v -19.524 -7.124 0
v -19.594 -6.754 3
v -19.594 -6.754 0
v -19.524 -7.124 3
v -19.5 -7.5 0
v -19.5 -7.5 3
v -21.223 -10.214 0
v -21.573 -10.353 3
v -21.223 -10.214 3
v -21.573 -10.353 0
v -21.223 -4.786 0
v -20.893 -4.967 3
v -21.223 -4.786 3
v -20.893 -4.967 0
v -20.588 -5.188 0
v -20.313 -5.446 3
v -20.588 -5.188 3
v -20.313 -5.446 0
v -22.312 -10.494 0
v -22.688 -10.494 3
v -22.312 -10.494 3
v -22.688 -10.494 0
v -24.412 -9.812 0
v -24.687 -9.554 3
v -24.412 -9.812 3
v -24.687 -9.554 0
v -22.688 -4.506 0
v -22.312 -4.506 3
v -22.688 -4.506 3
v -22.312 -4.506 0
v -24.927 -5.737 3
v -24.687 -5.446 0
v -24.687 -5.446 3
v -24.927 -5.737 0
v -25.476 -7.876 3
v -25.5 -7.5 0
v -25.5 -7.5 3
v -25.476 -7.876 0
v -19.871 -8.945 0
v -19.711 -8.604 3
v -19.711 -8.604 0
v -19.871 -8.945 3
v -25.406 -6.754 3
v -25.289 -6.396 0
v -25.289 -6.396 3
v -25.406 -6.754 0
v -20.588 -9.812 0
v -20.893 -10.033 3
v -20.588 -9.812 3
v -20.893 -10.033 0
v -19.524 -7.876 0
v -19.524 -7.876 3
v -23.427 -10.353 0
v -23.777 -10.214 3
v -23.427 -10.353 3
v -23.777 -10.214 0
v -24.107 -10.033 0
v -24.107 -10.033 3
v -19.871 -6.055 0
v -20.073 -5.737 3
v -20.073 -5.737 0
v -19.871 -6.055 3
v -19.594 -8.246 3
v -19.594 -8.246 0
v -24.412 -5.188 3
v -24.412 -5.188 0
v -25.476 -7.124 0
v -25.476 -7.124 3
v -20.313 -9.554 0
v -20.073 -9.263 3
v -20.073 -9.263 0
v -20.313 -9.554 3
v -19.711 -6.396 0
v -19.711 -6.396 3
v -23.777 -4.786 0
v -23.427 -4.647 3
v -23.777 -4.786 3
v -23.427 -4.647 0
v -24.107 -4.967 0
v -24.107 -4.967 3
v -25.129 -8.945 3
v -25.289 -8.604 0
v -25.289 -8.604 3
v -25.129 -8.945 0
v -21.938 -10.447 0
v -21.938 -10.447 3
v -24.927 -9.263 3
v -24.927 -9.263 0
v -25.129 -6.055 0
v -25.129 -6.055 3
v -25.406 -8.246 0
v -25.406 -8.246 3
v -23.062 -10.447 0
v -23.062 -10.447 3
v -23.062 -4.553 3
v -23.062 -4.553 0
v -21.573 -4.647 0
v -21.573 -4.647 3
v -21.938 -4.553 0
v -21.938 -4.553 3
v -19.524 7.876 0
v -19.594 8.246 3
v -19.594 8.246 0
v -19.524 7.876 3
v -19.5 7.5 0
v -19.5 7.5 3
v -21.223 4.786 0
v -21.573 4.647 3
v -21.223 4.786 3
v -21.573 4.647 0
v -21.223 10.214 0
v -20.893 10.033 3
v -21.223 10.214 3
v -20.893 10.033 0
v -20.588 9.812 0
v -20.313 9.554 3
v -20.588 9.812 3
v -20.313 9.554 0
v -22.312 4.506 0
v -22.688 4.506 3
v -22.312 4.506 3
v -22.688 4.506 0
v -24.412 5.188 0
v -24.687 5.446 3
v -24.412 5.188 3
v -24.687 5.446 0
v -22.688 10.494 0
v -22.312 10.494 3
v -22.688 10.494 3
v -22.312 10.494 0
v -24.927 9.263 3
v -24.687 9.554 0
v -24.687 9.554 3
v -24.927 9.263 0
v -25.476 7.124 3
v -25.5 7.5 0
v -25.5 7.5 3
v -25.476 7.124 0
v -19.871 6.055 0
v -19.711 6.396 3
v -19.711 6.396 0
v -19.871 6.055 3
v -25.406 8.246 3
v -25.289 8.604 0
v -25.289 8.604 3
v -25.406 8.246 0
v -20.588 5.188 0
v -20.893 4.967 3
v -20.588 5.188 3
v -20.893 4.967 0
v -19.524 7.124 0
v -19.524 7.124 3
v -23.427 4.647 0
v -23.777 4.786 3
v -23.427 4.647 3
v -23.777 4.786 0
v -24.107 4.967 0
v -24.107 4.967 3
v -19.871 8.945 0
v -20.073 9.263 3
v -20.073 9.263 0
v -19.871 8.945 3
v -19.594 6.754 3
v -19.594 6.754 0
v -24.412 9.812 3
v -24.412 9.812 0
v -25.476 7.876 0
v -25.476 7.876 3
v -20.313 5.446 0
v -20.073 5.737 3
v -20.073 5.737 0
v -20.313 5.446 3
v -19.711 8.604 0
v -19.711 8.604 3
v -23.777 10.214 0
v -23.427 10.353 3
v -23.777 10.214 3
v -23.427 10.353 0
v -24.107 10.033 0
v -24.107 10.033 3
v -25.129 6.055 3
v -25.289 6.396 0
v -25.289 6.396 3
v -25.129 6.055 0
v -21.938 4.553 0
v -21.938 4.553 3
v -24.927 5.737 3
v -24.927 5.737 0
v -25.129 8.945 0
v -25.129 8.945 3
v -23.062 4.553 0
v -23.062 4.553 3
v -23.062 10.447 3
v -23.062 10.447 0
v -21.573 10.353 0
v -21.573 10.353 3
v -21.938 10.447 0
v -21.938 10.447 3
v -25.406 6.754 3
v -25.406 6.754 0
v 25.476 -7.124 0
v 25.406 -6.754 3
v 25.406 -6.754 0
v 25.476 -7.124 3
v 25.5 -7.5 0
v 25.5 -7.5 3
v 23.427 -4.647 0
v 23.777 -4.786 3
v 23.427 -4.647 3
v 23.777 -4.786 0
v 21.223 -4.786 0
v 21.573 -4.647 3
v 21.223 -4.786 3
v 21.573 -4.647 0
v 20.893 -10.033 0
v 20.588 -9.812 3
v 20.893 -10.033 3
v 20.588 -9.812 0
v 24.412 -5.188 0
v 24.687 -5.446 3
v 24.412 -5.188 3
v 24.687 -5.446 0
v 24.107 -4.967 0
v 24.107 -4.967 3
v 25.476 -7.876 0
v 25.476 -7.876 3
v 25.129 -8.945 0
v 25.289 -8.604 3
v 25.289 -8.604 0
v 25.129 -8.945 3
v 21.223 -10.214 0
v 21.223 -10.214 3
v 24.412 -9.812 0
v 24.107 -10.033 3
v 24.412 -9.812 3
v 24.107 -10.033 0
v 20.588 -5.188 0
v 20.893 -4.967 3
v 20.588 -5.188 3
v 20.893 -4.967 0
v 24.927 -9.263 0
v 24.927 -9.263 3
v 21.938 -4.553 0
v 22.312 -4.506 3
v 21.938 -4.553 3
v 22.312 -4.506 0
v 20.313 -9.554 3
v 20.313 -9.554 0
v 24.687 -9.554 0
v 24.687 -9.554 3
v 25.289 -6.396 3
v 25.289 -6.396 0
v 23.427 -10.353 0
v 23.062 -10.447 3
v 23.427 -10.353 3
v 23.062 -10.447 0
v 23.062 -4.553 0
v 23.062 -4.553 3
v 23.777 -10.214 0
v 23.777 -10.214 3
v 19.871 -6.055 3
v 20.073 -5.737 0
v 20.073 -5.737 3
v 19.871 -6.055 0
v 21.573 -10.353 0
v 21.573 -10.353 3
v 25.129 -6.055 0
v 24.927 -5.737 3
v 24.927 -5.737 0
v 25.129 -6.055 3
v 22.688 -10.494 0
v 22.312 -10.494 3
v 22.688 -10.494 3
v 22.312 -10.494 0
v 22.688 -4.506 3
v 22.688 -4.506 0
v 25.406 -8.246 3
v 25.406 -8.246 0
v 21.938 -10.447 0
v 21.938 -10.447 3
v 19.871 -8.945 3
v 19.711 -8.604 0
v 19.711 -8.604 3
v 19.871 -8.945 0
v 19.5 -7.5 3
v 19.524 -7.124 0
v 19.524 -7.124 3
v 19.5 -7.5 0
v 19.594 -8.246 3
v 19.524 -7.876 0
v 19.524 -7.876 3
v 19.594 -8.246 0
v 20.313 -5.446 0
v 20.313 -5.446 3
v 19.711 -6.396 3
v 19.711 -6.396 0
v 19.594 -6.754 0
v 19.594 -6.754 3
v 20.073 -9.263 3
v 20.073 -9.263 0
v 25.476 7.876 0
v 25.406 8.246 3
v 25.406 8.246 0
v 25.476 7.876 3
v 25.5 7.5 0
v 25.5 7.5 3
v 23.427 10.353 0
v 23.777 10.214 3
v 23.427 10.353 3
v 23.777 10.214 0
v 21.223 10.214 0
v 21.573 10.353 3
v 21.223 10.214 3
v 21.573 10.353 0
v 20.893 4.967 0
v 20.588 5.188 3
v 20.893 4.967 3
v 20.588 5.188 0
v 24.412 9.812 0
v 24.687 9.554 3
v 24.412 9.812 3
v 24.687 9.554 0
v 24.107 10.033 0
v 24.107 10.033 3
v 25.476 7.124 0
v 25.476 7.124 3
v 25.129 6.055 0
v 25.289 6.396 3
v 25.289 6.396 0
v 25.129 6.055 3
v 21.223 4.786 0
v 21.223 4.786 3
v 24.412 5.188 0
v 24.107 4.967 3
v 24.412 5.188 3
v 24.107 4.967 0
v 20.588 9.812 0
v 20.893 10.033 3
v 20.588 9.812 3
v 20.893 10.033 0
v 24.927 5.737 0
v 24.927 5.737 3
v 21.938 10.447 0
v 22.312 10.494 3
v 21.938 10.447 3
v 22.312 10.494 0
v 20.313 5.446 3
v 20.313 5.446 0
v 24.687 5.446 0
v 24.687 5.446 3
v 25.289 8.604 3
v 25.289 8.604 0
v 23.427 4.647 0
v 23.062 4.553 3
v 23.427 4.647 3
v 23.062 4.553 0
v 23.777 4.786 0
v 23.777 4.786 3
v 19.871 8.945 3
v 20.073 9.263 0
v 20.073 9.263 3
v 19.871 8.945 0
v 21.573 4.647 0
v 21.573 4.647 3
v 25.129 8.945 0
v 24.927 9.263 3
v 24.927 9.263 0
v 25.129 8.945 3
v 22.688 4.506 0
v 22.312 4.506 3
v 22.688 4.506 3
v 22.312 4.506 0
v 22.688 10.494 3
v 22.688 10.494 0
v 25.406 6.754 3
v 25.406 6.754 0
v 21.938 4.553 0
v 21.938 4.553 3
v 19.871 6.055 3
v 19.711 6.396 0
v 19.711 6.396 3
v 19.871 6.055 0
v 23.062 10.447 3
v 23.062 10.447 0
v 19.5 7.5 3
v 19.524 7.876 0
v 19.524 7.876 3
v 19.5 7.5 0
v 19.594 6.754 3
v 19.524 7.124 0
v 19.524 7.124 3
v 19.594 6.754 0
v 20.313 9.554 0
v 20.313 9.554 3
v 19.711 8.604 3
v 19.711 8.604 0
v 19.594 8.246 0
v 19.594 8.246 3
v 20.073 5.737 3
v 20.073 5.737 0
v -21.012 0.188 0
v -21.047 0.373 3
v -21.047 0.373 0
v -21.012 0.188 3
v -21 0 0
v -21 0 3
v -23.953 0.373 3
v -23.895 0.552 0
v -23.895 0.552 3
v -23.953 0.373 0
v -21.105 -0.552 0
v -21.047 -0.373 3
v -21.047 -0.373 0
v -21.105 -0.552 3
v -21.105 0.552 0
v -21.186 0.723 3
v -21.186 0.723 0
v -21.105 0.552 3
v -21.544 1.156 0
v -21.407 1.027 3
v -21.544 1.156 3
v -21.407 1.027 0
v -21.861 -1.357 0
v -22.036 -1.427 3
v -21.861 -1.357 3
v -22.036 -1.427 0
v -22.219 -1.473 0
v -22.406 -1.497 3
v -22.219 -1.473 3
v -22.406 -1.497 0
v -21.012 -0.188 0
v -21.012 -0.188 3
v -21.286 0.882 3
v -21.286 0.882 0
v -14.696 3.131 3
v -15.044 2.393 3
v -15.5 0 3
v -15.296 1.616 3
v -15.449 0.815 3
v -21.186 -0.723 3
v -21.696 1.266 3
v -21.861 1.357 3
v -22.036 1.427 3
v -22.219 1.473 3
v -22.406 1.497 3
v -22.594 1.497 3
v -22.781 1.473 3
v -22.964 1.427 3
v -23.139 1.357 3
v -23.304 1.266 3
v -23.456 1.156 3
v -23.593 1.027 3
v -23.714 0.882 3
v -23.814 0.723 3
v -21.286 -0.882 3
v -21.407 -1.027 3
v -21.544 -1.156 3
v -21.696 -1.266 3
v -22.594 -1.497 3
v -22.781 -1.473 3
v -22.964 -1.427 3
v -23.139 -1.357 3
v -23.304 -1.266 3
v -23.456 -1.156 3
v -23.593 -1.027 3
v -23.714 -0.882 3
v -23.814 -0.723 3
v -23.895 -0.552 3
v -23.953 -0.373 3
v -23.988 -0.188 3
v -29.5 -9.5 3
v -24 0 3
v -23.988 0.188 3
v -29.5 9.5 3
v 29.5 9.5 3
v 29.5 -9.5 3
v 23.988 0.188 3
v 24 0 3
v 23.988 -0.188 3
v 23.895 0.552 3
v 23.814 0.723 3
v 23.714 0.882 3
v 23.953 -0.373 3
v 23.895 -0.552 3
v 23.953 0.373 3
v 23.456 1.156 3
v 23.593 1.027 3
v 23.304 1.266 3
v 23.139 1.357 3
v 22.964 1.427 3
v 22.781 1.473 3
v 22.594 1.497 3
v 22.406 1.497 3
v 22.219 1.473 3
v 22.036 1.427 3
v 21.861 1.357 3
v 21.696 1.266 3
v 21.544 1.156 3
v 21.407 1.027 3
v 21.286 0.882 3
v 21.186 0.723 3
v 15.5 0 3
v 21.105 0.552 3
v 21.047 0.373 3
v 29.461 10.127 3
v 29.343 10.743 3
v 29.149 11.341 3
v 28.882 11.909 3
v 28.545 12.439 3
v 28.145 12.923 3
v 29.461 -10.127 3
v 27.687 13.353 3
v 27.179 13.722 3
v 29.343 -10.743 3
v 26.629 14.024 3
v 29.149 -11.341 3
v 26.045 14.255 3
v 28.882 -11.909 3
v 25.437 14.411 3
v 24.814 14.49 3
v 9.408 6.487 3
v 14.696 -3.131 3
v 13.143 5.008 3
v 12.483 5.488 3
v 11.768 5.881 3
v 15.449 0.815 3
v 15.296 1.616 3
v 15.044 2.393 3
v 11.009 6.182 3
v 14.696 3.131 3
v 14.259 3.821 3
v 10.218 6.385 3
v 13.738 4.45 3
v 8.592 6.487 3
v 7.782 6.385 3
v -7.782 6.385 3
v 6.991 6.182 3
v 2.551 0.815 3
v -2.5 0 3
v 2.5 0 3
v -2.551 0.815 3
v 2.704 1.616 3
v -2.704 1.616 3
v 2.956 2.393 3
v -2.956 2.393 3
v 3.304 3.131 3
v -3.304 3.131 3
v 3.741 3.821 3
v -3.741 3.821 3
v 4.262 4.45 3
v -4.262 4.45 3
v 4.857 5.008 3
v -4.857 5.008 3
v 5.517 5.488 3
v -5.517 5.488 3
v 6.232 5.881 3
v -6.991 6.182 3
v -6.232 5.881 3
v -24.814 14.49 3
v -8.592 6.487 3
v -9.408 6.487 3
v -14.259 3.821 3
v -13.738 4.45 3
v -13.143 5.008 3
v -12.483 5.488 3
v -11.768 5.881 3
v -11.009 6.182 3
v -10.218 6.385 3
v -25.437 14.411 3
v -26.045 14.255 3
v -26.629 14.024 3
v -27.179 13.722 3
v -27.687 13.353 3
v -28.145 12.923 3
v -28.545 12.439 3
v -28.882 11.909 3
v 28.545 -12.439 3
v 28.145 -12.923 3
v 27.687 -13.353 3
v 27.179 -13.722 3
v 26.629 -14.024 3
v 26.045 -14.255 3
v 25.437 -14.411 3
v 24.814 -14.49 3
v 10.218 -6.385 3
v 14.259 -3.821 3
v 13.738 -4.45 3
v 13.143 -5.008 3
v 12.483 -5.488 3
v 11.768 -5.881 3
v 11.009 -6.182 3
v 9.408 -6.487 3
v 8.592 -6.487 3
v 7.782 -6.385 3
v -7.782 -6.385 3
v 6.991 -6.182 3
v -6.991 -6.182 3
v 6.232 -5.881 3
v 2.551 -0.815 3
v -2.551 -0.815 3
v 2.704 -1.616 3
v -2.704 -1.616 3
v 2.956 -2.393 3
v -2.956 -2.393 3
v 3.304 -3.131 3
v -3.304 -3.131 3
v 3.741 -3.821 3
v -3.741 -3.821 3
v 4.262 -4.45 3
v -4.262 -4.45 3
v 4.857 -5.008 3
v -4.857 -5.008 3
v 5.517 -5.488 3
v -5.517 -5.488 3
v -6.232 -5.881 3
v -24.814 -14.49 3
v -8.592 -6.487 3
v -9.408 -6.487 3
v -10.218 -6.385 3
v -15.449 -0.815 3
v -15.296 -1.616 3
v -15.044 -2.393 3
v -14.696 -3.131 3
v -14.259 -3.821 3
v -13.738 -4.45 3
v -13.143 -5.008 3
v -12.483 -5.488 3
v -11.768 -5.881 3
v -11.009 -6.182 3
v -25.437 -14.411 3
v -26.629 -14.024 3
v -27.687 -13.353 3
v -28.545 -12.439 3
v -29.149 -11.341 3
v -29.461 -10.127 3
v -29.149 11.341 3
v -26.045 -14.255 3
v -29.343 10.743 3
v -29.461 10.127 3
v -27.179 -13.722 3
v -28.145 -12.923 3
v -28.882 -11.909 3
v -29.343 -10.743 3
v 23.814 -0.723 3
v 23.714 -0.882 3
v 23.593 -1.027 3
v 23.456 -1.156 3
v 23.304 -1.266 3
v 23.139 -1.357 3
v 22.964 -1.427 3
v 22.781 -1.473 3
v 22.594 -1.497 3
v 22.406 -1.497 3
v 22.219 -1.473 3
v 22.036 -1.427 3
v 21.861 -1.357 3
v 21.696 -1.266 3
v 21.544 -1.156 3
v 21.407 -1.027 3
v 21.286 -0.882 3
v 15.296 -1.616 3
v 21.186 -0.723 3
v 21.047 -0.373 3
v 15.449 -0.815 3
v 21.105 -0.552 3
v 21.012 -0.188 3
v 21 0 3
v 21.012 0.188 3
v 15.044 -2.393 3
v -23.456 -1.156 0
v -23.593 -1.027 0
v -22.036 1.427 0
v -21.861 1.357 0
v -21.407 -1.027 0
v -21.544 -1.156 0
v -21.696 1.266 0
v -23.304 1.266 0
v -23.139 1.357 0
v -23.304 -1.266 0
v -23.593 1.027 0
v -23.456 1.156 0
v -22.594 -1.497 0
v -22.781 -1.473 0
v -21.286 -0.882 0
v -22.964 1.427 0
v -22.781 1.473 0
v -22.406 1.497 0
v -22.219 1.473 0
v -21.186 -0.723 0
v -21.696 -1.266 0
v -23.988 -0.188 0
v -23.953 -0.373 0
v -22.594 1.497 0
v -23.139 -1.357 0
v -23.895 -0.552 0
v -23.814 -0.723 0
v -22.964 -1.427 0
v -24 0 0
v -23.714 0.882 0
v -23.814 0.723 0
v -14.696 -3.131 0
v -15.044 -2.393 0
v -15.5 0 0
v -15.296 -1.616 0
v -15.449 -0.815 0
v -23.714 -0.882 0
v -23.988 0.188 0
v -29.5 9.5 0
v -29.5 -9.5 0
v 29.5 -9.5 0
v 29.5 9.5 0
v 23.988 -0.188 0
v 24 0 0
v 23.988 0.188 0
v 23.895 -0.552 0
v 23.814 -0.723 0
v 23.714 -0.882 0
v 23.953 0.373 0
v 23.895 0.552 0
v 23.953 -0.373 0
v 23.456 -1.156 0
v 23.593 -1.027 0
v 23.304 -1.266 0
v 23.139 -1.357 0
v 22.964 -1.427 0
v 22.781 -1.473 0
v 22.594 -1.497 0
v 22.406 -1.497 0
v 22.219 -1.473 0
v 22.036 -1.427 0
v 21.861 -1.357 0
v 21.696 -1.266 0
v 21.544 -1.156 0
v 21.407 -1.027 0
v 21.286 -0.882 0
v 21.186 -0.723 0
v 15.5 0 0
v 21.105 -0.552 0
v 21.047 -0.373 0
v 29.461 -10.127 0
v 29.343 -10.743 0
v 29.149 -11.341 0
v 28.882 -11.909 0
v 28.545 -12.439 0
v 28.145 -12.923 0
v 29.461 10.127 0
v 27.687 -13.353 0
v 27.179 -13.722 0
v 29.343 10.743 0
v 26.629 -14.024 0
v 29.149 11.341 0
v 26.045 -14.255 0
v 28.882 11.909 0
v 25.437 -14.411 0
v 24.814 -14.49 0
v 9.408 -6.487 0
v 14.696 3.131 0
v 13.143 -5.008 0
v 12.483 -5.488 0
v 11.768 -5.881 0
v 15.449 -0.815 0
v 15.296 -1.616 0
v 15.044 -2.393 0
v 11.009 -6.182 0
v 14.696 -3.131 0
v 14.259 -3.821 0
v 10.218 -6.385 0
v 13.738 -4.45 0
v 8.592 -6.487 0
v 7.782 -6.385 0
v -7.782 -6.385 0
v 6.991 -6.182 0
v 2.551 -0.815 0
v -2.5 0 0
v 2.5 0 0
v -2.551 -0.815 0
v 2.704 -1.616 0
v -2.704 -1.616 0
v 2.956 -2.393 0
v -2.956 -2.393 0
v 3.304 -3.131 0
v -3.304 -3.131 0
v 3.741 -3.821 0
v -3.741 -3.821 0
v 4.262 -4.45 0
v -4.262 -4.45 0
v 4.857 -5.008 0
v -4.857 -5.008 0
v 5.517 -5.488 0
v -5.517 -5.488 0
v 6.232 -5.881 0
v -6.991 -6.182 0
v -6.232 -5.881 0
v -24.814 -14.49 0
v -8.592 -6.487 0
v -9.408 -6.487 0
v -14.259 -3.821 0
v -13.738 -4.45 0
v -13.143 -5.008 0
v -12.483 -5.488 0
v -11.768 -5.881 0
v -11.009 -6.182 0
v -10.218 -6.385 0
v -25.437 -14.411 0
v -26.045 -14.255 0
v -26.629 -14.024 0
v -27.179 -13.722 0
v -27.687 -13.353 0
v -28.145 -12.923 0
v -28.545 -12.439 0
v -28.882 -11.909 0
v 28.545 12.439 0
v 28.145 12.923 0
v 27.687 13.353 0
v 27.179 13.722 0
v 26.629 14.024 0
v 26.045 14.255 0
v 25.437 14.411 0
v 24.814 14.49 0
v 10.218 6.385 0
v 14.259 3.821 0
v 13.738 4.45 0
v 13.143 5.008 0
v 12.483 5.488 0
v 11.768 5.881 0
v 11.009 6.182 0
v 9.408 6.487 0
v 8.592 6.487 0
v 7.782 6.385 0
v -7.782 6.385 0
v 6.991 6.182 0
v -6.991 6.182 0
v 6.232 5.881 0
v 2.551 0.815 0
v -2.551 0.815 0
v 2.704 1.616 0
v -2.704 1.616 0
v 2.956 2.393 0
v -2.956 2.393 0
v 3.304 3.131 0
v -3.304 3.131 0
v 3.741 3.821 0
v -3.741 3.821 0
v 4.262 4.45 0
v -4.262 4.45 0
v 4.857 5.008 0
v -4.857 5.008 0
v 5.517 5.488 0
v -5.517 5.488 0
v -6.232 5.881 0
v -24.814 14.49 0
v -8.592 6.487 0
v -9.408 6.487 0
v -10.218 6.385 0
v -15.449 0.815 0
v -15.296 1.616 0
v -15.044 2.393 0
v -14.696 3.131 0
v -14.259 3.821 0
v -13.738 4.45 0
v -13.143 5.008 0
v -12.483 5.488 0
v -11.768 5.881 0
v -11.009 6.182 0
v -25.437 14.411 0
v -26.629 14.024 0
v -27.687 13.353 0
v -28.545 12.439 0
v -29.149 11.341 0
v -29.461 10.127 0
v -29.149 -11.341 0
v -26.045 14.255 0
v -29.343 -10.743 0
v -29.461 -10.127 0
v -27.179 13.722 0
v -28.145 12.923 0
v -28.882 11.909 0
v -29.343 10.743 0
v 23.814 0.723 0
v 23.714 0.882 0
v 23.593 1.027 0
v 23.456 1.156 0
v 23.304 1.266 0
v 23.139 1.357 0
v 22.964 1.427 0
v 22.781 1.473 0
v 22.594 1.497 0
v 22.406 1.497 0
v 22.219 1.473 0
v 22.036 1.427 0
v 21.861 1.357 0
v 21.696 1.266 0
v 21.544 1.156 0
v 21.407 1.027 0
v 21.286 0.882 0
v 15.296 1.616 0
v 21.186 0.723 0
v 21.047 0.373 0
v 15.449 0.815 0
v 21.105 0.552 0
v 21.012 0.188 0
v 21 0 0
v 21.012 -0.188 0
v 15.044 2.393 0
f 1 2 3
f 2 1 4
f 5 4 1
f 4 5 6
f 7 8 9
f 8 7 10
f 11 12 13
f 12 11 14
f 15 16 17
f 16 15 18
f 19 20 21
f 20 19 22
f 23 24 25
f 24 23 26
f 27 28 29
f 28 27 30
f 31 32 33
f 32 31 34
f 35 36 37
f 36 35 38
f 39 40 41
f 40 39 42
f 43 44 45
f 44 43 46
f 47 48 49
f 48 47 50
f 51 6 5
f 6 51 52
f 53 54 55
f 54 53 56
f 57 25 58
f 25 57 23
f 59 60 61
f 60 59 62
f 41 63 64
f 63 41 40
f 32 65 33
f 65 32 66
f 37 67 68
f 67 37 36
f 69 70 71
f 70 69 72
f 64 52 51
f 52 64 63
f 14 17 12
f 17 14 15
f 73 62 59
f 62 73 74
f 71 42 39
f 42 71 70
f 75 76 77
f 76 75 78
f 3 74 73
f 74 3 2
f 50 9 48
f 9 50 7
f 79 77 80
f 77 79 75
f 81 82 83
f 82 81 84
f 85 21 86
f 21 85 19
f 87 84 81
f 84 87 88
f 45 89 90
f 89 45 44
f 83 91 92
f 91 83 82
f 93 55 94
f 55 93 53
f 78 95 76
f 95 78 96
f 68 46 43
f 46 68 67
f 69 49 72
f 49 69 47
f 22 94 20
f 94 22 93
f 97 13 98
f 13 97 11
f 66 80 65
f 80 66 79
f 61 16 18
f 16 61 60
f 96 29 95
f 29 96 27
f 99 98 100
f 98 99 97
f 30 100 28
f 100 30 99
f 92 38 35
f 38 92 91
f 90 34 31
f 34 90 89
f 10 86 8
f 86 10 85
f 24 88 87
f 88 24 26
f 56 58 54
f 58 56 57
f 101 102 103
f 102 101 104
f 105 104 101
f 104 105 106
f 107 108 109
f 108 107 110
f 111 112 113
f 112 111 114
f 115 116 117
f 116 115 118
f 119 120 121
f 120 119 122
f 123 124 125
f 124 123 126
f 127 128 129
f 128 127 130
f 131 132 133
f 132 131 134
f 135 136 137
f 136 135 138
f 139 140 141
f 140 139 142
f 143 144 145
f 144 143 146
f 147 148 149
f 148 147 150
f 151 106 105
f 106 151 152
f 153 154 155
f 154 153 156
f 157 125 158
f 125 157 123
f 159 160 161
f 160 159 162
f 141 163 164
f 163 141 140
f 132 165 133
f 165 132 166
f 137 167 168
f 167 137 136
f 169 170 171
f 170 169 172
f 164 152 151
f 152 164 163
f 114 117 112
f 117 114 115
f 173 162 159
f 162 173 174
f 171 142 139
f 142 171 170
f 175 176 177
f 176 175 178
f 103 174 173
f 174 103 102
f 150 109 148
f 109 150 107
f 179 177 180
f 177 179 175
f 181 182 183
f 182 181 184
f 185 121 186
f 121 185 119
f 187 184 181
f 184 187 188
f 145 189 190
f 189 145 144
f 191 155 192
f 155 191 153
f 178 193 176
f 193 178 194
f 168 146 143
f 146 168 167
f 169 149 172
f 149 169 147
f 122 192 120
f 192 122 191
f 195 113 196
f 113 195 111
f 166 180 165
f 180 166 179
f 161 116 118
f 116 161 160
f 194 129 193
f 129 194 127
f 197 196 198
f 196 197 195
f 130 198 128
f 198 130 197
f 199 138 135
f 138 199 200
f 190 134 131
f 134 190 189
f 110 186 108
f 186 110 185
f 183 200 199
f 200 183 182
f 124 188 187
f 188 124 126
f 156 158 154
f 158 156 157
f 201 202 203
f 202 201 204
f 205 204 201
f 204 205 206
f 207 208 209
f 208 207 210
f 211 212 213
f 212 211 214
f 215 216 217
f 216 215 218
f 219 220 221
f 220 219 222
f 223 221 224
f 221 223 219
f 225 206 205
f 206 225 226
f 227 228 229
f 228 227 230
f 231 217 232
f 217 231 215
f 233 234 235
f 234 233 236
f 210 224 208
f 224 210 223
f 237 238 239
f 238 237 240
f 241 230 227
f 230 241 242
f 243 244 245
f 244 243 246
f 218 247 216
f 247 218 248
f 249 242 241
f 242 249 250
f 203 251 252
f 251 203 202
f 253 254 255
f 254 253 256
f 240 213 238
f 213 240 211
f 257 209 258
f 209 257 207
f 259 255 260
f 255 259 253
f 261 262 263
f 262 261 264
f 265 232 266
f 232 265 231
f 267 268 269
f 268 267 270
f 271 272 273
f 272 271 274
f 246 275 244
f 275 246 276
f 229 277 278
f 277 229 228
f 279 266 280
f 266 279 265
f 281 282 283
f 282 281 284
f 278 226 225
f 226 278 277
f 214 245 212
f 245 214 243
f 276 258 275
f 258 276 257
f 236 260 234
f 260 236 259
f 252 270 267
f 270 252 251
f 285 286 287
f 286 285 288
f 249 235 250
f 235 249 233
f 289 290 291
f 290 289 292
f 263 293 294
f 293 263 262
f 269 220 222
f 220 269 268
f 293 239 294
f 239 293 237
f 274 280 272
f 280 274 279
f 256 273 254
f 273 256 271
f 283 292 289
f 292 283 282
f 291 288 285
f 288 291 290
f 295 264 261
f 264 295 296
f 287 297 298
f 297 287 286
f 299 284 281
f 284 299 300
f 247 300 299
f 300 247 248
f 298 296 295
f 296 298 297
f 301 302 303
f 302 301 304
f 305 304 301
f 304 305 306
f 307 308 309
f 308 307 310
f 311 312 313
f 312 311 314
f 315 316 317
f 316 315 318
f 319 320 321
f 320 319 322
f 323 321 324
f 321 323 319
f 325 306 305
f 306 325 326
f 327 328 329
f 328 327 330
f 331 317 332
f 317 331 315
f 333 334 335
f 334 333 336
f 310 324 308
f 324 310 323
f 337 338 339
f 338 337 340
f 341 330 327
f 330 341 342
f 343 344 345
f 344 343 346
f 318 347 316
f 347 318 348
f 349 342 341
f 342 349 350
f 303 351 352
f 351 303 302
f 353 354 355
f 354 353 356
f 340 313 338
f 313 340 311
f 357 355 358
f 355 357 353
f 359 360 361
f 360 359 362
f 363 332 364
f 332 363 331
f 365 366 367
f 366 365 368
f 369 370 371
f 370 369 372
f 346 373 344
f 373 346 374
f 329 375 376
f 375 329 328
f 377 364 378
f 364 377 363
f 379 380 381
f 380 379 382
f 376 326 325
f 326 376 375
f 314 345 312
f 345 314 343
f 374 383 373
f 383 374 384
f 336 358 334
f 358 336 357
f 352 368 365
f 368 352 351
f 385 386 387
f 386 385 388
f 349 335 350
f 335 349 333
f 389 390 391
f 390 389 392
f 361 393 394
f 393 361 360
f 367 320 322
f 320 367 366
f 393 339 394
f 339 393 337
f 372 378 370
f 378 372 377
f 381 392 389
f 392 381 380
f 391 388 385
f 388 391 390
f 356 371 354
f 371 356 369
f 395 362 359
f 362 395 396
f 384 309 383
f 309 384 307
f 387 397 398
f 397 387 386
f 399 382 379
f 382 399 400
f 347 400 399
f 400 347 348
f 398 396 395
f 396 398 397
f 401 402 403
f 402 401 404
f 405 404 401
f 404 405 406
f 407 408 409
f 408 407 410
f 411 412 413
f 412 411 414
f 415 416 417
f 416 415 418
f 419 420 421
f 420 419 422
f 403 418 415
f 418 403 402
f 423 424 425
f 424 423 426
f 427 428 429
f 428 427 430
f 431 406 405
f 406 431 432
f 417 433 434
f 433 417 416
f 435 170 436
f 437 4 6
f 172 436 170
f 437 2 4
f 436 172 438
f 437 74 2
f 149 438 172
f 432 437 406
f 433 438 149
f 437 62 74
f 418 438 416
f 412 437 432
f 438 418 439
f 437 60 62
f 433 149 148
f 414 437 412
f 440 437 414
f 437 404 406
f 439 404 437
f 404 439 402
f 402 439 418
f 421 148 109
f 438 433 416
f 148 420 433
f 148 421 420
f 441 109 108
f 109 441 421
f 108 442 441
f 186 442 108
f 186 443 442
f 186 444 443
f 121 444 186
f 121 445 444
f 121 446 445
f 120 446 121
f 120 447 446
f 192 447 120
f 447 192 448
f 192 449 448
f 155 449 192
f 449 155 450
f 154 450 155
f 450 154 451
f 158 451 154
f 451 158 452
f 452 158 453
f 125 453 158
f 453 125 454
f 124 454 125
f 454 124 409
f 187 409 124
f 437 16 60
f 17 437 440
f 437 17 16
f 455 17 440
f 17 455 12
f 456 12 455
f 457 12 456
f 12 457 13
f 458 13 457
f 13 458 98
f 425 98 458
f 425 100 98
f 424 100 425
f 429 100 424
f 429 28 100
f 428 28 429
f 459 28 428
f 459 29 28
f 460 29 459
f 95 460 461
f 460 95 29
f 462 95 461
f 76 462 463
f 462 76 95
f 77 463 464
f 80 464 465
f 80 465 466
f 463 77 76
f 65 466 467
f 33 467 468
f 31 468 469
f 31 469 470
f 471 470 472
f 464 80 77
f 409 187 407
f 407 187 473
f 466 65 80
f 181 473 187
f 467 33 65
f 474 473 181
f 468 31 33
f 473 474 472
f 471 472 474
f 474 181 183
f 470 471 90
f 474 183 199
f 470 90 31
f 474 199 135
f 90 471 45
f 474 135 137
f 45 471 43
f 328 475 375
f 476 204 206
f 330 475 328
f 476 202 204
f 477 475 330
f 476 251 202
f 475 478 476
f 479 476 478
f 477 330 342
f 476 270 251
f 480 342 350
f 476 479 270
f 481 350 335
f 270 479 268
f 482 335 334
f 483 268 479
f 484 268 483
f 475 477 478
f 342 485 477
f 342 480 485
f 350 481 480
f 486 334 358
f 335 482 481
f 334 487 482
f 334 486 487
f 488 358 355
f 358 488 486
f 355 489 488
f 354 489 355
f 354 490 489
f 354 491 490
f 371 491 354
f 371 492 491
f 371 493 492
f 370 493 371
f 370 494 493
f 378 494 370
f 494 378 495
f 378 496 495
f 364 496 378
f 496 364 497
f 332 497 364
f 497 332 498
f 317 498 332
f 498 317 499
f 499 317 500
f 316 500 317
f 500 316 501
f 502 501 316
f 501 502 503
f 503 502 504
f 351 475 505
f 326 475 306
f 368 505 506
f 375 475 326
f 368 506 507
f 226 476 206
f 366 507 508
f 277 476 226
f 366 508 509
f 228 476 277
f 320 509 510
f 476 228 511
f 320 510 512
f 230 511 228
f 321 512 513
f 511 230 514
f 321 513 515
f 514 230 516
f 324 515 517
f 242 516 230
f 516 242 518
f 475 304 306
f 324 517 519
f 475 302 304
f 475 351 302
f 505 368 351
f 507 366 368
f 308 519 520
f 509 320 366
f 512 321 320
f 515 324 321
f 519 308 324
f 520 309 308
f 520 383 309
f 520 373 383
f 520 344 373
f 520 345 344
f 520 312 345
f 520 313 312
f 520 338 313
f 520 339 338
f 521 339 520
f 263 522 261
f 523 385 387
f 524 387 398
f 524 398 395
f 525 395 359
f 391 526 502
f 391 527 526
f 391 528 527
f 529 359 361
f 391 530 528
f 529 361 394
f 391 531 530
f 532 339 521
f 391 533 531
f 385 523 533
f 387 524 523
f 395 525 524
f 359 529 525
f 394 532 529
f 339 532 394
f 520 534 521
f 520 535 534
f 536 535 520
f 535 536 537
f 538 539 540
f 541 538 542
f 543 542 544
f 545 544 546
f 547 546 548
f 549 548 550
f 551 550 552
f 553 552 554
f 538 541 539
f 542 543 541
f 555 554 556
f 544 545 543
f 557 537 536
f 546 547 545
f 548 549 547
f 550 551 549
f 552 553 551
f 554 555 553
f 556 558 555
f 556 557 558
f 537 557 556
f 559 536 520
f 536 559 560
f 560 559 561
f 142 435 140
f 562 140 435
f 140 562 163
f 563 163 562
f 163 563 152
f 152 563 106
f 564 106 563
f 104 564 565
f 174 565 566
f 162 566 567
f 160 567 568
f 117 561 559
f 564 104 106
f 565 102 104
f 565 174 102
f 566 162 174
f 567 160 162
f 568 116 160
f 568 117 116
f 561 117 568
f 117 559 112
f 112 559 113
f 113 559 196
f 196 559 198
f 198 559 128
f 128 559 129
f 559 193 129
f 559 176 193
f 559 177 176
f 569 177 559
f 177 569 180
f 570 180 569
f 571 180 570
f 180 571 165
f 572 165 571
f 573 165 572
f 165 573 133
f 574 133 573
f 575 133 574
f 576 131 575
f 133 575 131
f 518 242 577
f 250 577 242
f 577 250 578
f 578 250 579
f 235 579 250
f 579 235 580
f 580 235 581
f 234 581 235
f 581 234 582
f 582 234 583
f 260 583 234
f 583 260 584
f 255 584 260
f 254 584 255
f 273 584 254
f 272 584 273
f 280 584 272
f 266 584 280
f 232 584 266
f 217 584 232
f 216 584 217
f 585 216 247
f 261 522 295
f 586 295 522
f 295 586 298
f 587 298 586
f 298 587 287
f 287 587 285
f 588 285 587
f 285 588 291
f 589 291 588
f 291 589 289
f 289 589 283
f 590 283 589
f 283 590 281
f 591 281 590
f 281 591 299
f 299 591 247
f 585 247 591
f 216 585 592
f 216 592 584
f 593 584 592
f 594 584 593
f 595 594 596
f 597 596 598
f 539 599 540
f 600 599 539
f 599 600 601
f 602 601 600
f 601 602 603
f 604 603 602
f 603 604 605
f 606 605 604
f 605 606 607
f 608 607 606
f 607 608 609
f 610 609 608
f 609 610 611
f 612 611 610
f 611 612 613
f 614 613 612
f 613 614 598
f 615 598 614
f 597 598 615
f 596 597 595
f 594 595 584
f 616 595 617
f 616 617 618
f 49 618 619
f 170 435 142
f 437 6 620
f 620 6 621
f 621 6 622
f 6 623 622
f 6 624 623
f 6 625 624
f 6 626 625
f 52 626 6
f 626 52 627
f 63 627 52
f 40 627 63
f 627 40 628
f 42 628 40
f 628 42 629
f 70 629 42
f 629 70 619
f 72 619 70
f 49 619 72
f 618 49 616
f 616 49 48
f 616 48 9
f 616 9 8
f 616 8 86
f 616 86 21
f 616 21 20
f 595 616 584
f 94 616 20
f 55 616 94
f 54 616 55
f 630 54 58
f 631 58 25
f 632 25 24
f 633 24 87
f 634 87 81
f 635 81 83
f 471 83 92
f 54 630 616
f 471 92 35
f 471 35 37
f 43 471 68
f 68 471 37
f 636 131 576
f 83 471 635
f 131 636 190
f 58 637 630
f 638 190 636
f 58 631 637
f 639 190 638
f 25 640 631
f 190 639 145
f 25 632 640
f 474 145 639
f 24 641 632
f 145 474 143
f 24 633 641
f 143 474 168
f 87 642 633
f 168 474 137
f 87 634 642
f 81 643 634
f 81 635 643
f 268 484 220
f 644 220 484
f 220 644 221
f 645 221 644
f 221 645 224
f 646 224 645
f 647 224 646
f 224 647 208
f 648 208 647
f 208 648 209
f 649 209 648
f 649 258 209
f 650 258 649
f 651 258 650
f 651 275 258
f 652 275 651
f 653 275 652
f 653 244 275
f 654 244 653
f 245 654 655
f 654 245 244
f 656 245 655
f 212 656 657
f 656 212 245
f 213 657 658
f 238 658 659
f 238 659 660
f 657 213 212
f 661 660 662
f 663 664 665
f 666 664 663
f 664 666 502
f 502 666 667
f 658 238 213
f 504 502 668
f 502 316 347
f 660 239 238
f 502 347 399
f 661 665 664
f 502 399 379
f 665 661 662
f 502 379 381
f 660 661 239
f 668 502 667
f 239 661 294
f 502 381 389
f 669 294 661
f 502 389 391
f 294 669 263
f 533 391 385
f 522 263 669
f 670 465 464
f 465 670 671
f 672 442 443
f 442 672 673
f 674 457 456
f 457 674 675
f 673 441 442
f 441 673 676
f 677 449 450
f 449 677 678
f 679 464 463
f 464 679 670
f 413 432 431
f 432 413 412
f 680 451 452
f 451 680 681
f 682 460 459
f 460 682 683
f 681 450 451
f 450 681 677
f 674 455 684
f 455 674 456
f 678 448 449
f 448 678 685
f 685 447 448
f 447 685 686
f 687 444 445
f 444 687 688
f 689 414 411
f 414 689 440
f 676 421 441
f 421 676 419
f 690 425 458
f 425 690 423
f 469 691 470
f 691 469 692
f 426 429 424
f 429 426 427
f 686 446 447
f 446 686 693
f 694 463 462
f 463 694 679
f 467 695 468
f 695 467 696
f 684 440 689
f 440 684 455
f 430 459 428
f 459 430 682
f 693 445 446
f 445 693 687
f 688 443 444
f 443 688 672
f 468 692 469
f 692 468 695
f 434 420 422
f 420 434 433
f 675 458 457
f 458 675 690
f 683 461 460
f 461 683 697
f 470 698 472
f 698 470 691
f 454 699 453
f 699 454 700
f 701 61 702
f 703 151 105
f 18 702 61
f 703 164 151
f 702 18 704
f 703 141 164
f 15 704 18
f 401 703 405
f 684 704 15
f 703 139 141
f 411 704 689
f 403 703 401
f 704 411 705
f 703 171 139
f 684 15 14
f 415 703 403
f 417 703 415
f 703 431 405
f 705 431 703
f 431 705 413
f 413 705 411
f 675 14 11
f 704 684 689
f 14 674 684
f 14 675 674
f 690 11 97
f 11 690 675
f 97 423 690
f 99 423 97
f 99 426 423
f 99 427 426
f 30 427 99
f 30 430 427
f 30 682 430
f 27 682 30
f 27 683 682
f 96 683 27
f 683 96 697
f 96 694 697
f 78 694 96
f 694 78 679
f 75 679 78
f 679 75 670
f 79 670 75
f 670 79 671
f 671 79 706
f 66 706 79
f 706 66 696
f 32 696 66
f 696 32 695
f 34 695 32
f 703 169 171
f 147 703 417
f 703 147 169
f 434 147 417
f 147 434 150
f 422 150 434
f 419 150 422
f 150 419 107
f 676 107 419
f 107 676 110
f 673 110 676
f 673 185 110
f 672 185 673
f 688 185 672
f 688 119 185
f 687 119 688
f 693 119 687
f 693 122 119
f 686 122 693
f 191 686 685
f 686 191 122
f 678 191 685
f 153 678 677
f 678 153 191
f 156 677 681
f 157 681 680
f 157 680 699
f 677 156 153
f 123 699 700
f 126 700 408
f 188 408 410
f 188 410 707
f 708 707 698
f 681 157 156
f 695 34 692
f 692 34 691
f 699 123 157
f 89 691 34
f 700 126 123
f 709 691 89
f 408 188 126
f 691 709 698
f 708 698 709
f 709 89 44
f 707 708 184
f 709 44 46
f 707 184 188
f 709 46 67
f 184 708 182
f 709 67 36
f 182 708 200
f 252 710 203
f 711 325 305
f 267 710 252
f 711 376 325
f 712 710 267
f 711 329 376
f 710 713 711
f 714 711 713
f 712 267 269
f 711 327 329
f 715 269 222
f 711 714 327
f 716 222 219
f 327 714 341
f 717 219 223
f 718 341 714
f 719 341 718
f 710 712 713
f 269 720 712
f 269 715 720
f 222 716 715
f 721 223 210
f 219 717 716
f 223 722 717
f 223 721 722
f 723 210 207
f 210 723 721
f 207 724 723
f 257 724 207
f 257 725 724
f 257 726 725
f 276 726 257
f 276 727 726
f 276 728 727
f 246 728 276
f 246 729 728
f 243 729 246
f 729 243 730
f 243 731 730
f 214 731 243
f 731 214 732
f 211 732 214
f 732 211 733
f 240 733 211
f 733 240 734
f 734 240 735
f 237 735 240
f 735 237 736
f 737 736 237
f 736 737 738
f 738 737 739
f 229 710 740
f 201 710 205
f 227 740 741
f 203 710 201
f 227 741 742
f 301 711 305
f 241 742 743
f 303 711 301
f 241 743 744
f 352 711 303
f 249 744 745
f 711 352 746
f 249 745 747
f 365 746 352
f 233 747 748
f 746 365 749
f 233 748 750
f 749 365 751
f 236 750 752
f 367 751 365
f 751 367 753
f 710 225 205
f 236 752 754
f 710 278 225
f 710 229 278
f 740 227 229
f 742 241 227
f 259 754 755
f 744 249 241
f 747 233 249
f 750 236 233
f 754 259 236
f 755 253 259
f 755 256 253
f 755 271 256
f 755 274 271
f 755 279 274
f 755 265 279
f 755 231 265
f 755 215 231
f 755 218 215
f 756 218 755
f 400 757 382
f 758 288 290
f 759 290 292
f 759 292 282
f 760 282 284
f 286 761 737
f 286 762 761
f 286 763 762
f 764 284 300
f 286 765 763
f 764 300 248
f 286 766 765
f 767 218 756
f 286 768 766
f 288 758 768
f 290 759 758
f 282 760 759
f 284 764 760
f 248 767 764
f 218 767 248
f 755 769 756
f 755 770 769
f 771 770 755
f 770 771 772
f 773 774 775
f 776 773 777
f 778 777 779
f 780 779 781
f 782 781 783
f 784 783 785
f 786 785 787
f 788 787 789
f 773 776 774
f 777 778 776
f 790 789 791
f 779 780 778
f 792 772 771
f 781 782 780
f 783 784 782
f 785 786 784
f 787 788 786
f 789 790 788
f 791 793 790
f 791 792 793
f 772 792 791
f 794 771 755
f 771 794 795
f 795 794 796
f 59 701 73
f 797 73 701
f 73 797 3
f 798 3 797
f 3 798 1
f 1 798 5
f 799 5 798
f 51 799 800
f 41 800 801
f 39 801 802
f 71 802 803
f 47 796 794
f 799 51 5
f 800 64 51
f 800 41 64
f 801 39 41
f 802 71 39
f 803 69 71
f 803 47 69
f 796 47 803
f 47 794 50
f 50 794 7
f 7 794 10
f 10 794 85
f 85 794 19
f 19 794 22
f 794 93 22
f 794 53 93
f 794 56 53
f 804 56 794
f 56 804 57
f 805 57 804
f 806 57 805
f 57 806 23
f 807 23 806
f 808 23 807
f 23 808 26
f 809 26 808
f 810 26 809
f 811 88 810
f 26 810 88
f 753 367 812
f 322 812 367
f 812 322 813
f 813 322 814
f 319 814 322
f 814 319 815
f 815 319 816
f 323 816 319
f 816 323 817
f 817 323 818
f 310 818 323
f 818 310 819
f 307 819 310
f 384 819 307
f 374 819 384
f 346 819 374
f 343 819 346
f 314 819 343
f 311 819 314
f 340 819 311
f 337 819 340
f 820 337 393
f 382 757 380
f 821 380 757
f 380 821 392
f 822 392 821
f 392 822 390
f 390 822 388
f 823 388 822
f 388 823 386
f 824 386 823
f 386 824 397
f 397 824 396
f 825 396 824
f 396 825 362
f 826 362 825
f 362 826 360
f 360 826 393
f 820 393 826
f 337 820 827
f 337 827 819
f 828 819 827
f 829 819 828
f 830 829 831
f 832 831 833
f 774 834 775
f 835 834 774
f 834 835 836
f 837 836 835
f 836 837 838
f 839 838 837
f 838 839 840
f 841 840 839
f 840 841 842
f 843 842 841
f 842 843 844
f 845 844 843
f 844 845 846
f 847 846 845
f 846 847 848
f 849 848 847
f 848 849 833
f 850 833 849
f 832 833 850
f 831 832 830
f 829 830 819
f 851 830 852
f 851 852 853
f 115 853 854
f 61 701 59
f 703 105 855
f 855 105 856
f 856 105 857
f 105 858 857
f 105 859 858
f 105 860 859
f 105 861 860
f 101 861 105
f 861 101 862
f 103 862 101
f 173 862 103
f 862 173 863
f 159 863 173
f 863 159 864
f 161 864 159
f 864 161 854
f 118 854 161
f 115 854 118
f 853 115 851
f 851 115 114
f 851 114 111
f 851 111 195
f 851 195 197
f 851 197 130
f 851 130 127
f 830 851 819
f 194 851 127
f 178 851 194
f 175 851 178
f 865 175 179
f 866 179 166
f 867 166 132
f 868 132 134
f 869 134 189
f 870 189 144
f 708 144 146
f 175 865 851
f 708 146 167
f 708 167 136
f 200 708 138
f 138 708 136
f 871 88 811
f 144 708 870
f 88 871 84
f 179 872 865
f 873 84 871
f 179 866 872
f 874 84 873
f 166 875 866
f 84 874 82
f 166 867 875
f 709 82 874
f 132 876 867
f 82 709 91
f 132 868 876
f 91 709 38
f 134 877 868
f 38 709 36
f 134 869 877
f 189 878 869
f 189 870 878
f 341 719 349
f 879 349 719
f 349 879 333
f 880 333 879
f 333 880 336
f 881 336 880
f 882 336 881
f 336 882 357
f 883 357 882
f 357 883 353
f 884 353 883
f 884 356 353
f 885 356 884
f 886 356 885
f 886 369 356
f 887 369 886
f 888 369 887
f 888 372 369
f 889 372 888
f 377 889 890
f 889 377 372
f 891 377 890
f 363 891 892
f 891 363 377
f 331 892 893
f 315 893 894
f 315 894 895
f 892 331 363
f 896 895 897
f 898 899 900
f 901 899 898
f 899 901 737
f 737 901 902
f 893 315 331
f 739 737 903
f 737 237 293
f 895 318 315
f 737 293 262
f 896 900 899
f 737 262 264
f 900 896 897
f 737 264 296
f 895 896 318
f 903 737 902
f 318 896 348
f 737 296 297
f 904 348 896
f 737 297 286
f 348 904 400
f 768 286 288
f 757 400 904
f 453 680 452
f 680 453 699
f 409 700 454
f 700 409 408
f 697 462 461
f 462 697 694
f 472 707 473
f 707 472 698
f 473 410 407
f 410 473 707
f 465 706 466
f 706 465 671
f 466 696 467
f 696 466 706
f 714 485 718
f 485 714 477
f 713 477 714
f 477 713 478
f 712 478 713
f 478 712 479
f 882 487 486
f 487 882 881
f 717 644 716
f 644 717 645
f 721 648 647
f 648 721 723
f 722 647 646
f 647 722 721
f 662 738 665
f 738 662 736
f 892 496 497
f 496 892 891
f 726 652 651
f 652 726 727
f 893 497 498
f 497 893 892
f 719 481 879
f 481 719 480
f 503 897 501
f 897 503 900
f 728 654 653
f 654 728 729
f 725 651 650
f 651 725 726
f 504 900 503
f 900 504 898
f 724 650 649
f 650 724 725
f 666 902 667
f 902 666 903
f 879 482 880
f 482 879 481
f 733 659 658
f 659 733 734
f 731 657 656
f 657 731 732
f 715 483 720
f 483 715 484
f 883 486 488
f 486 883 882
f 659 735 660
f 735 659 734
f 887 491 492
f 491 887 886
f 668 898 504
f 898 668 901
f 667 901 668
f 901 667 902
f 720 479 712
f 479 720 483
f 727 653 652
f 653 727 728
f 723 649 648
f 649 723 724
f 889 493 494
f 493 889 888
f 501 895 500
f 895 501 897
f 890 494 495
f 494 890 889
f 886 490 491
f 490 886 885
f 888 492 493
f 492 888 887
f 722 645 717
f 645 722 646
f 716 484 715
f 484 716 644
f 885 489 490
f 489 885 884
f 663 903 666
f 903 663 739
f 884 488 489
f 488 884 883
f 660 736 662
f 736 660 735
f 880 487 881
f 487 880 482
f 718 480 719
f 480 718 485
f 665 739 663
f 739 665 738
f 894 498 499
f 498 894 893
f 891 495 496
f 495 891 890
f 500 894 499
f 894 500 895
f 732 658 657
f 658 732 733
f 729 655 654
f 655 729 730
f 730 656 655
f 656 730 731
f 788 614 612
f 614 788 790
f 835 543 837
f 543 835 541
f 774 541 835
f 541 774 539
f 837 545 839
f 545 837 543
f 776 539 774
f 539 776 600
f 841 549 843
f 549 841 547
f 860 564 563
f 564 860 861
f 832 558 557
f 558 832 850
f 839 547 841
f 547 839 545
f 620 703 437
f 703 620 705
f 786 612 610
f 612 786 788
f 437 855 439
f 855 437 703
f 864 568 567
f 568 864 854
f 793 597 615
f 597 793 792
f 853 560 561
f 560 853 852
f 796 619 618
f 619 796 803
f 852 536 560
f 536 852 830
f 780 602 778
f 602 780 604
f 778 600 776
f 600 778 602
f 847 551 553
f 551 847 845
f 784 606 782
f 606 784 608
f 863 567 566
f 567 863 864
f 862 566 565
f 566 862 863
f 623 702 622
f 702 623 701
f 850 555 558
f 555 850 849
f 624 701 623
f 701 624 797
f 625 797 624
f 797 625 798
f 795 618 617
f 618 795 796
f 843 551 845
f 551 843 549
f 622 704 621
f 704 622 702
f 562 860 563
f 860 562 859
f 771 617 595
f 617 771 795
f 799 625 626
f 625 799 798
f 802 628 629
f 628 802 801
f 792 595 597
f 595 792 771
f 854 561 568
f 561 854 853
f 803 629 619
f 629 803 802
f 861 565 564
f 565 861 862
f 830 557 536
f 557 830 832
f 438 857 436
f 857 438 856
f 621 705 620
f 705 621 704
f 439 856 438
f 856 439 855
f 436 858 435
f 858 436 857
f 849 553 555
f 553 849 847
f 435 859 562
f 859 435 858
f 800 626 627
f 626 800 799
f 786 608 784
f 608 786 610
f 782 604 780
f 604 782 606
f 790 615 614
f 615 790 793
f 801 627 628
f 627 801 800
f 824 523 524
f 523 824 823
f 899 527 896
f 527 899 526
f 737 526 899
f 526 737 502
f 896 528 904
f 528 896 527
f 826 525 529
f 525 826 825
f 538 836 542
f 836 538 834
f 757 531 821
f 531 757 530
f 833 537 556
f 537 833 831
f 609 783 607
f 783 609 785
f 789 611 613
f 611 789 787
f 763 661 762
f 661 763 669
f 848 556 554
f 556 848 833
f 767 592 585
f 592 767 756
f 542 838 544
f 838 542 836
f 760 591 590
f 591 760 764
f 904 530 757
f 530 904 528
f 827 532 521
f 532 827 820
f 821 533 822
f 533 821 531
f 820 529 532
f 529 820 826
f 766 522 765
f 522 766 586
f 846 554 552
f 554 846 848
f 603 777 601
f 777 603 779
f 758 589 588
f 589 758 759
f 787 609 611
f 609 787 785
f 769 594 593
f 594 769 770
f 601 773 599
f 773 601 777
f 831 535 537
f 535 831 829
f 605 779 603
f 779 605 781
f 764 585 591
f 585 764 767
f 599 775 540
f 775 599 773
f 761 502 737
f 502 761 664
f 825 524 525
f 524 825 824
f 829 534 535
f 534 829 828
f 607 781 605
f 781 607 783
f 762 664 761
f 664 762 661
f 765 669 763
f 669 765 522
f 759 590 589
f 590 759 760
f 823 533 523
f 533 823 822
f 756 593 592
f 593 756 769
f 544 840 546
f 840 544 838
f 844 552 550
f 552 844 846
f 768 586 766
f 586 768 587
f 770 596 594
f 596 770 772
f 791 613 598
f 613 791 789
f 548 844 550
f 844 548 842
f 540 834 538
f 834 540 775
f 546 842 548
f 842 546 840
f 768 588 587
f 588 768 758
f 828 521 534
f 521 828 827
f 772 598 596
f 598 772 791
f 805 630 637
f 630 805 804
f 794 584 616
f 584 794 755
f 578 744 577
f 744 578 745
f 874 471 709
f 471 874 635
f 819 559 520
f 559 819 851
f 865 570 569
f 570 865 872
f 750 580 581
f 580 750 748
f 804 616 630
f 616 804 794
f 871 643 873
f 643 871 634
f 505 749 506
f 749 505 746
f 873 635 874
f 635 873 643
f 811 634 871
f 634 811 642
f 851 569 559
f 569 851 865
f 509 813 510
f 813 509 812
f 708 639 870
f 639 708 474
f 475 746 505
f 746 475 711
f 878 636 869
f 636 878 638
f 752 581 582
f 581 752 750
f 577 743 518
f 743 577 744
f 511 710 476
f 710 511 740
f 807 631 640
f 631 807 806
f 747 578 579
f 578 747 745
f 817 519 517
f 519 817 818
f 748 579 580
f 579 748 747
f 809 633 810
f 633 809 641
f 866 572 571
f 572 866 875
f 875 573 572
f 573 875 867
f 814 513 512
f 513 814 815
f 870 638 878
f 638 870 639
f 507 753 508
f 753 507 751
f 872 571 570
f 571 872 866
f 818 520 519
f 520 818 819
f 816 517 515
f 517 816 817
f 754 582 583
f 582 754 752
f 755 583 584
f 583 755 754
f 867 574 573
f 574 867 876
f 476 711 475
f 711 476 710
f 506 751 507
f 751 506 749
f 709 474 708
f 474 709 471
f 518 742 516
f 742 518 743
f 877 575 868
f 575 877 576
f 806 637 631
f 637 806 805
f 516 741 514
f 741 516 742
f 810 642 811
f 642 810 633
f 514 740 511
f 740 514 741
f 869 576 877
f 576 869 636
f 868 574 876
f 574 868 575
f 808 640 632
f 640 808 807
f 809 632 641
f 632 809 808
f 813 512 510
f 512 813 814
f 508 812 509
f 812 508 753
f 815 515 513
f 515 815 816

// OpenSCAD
$fn = 50;


difference() {
	union() {
		hull() {
			translate(v = [-24.5000000000, 9.5000000000, 0]) {
				cylinder(h = 3, r = 5);
			}
			translate(v = [24.5000000000, 9.5000000000, 0]) {
				cylinder(h = 3, r = 5);
			}
			translate(v = [-24.5000000000, -9.5000000000, 0]) {
				cylinder(h = 3, r = 5);
			}
			translate(v = [24.5000000000, -9.5000000000, 0]) {
				cylinder(h = 3, r = 5);
			}
		}
	}
	union() {
		#translate(v = [-22.5000000000, -7.5000000000, 0]) {
			cylinder(h = 3, r = 3.0000000000);
		}
		#translate(v = [-22.5000000000, 7.5000000000, 0]) {
			cylinder(h = 3, r = 3.0000000000);
		}
		#translate(v = [22.5000000000, -7.5000000000, 0]) {
			cylinder(h = 3, r = 3.0000000000);
		}
		#translate(v = [22.5000000000, 7.5000000000, 0]) {
			cylinder(h = 3, r = 3.0000000000);
		}
		#translate(v = [-22.5000000000, -7.5000000000, -100.0000000000]) {
			cylinder(h = 200, r = 3.0000000000);
		}
		#translate(v = [-22.5000000000, 7.5000000000, -100.0000000000]) {
			cylinder(h = 200, r = 3.0000000000);
		}
		#translate(v = [22.5000000000, -7.5000000000, -100.0000000000]) {
			cylinder(h = 200, r = 3.0000000000);
		}
		#translate(v = [22.5000000000, 7.5000000000, -100.0000000000]) {
			cylinder(h = 200, r = 3.0000000000);
		}
		#translate(v = [-22.5000000000, -7.5000000000, 0]) {
			cylinder(h = 3, r = 1.5000000000);
		}
		#translate(v = [-22.5000000000, 0.0000000000, 0]) {
			cylinder(h = 3, r = 1.5000000000);
		}
		#translate(v = [-22.5000000000, 7.5000000000, 0]) {
			cylinder(h = 3, r = 1.5000000000);
		}
		#translate(v = [22.5000000000, -7.5000000000, 0]) {
			cylinder(h = 3, r = 1.5000000000);
		}
		#translate(v = [22.5000000000, 0.0000000000, 0]) {
			cylinder(h = 3, r = 1.5000000000);
		}
		#translate(v = [22.5000000000, 7.5000000000, 0]) {
			cylinder(h = 3, r = 1.5000000000);
		}
		#translate(v = [-22.5000000000, -7.5000000000, 0]) {
			cylinder(h = 3, r = 1.5000000000);
		}
		#translate(v = [-22.5000000000, 0.0000000000, 0]) {
			cylinder(h = 3, r = 1.5000000000);
		}
		#translate(v = [-22.5000000000, 7.5000000000, 0]) {
			cylinder(h = 3, r = 1.5000000000);
		}
		#translate(v = [22.5000000000, -7.5000000000, 0]) {
			cylinder(h = 3, r = 1.5000000000);
		}
		#translate(v = [22.5000000000, 0.0000000000, 0]) {
			cylinder(h = 3, r = 1.5000000000);
		}
		#translate(v = [22.5000000000, 7.5000000000, 0]) {
			cylinder(h = 3, r = 1.5000000000);
		}
		#translate(v = [-22.5000000000, -7.5000000000, 0]) {
			cylinder(h = 3, r = 1.5000000000);
		}
		#translate(v = [-22.5000000000, 0.0000000000, 0]) {
			cylinder(h = 3, r = 1.5000000000);
		}
		#translate(v = [-22.5000000000, 7.5000000000, 0]) {
			cylinder(h = 3, r = 1.5000000000);
		}
		#translate(v = [22.5000000000, -7.5000000000, 0]) {
			cylinder(h = 3, r = 1.5000000000);
		}
		#translate(v = [22.5000000000, 0.0000000000, 0]) {
			cylinder(h = 3, r = 1.5000000000);
		}
		#translate(v = [22.5000000000, 7.5000000000, 0]) {
			cylinder(h = 3, r = 1.5000000000);
		}
		#translate(v = [-9.0000000000, 0, 0]) {
			cylinder(h = 3, r = 6.5000000000);
		}
		#translate(v = [9.0000000000, 0, 0]) {
			cylinder(h = 3, r = 6.5000000000);
		}
	}
}
